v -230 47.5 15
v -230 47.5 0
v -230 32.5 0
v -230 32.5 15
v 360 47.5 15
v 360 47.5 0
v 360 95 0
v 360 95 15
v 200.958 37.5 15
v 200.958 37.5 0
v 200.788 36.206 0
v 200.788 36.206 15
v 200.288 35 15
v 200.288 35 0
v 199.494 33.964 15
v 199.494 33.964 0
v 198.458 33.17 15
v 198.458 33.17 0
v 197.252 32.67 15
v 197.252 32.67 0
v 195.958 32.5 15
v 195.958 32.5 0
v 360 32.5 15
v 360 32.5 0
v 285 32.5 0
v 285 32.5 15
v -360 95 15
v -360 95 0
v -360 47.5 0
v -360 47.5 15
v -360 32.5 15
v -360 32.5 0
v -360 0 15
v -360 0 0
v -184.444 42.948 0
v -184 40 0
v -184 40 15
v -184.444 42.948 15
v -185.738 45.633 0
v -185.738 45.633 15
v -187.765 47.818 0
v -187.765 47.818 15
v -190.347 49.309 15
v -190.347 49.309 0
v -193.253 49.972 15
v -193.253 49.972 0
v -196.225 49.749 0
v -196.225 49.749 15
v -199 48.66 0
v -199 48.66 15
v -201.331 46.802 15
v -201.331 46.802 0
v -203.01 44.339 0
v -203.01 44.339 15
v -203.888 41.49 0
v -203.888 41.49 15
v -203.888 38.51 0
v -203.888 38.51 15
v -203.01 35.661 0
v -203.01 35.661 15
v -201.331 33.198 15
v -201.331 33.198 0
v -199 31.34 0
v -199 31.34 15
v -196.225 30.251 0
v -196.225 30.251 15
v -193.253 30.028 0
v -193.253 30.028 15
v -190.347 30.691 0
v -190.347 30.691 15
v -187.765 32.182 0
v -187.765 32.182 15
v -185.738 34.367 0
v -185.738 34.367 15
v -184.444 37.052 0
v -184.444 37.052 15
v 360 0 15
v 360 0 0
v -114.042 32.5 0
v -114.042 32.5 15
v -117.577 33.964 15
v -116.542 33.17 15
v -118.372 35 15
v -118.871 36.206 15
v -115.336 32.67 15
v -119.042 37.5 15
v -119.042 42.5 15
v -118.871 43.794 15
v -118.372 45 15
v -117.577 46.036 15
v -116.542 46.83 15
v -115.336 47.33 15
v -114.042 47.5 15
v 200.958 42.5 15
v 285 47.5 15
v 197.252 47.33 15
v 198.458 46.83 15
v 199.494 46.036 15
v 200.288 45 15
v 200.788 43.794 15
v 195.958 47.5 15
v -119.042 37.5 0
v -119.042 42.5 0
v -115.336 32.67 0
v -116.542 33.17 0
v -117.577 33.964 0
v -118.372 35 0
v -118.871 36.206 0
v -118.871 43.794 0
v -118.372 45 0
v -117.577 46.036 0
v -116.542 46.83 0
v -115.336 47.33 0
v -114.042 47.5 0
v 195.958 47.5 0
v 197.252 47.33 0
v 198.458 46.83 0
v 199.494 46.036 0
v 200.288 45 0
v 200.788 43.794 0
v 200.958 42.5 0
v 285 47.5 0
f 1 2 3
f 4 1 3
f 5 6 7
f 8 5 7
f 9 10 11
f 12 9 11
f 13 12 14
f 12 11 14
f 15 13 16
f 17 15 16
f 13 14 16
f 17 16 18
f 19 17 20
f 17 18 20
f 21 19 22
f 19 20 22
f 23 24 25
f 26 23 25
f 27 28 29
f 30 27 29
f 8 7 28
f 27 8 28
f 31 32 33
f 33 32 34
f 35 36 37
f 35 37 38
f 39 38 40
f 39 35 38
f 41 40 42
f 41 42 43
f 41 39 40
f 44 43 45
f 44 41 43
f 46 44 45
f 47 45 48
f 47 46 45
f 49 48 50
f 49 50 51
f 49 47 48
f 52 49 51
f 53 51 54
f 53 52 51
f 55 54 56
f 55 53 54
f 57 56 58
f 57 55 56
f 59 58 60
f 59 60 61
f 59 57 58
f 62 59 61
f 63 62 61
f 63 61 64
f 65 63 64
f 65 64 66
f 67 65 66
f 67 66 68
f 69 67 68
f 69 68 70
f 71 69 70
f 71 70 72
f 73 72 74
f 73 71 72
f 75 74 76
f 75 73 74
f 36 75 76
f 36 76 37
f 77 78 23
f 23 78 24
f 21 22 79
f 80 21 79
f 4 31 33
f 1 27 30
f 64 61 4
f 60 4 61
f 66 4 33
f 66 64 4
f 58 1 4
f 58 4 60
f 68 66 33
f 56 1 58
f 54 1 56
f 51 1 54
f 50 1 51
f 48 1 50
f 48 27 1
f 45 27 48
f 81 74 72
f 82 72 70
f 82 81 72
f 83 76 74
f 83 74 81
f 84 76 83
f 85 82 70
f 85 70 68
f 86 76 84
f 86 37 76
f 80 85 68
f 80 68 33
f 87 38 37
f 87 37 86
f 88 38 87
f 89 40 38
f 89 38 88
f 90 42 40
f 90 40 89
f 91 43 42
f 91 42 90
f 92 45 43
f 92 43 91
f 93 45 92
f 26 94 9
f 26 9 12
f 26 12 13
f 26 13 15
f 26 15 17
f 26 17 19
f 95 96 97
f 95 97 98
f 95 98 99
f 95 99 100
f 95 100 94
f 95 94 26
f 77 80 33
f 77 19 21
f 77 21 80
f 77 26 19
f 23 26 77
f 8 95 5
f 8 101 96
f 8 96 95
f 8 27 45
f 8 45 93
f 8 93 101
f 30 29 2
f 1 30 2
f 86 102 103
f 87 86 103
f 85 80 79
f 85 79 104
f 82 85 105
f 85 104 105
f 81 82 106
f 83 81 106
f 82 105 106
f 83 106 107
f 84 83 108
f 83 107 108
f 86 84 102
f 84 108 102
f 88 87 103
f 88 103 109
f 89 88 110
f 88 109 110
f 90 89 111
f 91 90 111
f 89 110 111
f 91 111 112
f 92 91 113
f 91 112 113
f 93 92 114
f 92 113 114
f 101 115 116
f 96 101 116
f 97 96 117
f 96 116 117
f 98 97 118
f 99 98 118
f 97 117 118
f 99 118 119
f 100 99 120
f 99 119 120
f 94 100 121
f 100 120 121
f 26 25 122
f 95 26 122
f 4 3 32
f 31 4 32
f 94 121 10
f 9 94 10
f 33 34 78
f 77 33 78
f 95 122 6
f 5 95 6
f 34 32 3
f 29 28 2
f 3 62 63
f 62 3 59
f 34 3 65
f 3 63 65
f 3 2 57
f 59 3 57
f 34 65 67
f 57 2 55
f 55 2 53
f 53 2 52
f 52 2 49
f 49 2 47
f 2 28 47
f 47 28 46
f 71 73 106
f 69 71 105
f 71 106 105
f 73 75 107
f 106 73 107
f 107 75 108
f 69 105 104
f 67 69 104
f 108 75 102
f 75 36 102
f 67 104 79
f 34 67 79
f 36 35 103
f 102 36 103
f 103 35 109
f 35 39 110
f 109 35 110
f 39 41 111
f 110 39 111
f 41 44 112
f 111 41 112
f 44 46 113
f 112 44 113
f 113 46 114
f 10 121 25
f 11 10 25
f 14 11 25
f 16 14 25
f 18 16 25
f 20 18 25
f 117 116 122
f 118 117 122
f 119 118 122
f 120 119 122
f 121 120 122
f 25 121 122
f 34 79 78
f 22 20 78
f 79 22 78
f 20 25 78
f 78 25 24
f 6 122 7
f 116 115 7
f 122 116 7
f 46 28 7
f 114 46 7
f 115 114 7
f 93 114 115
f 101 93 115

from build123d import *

# Parameters (mm, degrees)
F0_R     = 10
F1_DEPTH = 15


with BuildPart() as f1:
    # F0 (on Top) → F1 (new body)
    with BuildSketch(Plane.XY):
        Polygon((-360, 32.5), (-360, 0), (360, 0), (360, 32.5), (285, 32.5), (285, 47.5), (360, 47.5), (360, 95), (-360, 95), (-360, 47.5), (-230, 47.5), (-230, 32.5), align=None)
        with Locations((-194, 40)):
            Circle(F0_R, mode=Mode.SUBTRACT)
        with BuildLine():
            ThreePointArc((-119.041678, 42.5), (-117.577212, 46.035534), (-114.041678, 47.5))
            Line((-114.041678, 47.5), (195.958322, 47.5))
            ThreePointArc((195.958322, 47.5), (199.493856, 46.035534), (200.958322, 42.5))
            Line((200.958322, 42.5), (200.958322, 37.5))
            ThreePointArc((200.958322, 37.5), (199.493856, 33.964466), (195.958322, 32.5))
            Line((195.958322, 32.5), (-114.041678, 32.5))
            ThreePointArc((-114.041678, 32.5), (-117.577212, 33.964466), (-119.041678, 37.5))
            Line((-119.041678, 37.5), (-119.041678, 42.5))
        make_face(mode=Mode.SUBTRACT)
    extrude(amount=F1_DEPTH)


solid = f1.part
